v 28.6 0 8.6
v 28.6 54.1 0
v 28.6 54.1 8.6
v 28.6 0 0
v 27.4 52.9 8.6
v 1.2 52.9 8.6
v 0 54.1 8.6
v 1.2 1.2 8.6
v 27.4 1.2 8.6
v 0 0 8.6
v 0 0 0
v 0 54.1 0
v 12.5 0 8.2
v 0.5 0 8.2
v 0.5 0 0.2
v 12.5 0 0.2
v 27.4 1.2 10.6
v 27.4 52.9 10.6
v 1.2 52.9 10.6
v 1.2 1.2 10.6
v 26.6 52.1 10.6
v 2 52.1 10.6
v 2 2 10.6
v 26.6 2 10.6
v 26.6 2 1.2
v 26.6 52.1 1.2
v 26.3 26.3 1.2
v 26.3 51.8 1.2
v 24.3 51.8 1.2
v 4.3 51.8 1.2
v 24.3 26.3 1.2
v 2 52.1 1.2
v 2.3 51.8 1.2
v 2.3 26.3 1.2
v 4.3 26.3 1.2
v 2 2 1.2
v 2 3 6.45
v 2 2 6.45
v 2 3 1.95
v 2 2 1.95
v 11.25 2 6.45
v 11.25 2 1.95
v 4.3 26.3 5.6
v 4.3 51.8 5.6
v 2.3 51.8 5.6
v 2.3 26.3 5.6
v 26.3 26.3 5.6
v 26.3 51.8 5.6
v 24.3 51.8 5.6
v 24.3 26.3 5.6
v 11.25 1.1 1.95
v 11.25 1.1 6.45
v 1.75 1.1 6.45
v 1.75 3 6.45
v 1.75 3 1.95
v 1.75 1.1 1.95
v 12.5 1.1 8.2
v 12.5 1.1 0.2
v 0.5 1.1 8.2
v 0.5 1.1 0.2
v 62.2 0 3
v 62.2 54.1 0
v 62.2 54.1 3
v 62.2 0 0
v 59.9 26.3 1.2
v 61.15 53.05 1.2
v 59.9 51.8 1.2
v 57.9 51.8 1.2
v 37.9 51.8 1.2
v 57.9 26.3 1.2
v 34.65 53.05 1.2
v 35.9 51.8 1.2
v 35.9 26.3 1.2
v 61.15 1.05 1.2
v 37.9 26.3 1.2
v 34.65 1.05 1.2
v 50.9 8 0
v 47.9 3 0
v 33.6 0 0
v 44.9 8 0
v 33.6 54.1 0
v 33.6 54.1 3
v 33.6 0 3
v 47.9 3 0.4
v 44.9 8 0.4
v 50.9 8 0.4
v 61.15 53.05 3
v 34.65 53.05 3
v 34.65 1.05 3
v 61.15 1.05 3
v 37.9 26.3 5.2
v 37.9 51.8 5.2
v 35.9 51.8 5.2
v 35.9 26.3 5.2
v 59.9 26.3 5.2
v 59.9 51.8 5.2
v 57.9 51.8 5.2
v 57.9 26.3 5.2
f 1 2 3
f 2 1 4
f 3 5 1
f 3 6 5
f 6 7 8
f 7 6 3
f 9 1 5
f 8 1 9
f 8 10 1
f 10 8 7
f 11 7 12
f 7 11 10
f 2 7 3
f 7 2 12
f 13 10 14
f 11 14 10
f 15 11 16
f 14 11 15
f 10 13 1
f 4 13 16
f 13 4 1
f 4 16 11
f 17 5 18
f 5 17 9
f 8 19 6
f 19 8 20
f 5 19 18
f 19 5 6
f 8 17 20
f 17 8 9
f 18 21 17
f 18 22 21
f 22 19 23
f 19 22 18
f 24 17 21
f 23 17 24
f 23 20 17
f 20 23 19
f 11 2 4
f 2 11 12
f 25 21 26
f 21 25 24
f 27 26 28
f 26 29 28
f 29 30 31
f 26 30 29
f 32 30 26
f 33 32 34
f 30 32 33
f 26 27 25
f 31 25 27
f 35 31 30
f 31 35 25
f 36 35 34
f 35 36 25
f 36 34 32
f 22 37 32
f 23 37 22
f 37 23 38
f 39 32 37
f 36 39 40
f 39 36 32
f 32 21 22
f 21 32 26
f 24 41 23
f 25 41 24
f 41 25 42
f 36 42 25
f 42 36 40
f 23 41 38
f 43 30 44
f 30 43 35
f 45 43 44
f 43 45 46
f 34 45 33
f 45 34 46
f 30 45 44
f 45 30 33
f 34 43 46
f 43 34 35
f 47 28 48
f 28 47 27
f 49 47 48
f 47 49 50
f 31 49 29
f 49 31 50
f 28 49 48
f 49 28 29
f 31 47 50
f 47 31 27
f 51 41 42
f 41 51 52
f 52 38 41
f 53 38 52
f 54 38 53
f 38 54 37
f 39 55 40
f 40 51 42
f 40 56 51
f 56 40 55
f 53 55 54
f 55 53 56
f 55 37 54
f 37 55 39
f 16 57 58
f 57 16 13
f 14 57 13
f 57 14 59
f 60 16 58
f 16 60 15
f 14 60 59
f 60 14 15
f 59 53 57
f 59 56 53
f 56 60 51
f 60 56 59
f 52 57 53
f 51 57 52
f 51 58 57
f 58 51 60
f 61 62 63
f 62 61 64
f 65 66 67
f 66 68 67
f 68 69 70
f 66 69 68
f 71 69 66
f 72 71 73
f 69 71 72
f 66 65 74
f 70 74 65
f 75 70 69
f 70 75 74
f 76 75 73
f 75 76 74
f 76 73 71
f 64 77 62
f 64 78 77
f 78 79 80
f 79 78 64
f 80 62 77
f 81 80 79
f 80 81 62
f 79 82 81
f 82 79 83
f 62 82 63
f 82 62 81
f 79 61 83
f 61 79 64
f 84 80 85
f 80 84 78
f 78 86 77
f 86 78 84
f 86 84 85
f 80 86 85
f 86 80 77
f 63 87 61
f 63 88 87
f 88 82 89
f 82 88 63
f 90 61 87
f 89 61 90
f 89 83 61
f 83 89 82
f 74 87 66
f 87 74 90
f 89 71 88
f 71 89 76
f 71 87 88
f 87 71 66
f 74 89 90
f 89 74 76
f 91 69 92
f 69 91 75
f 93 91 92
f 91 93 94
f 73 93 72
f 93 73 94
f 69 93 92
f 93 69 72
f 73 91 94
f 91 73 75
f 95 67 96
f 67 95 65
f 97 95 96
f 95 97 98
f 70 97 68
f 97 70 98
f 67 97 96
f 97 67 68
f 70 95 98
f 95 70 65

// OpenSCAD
// Two-part case for the FYSETC SD-WIFI (non-Pro). Only the micro-USB port is open.
//
// Open in OpenSCAD and use the Customizer (Window > Customizer) to set the measured values,
// or render from the command line:
//   openscad -D 'part="base"' -o base.stl case.scad
//   openscad -D 'part="lid"'  -o lid.stl  case.scad
//
// Coordinates, looking down at the board with its front (ESP module, buttons) up: x across the
// board's 24 mm width, y along its length with y=0 at the USB/button end and y=board_l at the
// SD contacts, z up. The back of the board carries the micro-USB port (at the USB end, near the
// left edge from this view), the microSD slot and the switch.
//
// The board is held only by its SD-card half, which has no parts on either face: rails in the
// base support it from below and posts in the lid press on it from above.

/* [What to render] */
part = "both"; // [base, lid, both]

/* [Board: measure these] */
// Published
board_w = 24.0;
// Published
board_l = 49.5;
// PCB thickness
board_t = 1.0;
// Gap under the board: the tallest part on the back (micro-USB, microSD slot, switch) + 0.4, or more. The default keeps a USB plug's ~8 mm moulded body above the case's bottom face.
under = 4.4;
// Tallest part on the front (ESP module, buttons) + 0.4
over = 4.0;
// Micro-USB centre from the board's left edge, front up, USB end towards you
usb_x = 4.2;
// Micro-USB centre below the PCB's back face
usb_drop = 1.4;
// Where the part-free SD-card half starts, from the USB end
grip_from = 24.0;

/* [Case] */
// Gap between board and case walls
fit = 0.3;
// Leaves the lid's skirt about 1 mm, over two 0.4 mm nozzle lines
wall = 2.0;
floor_t = 1.2;
lid_t = 1.2;
// Inner part of the wall that rises into the lid's skirt
lip_w = 0.8;
lip_h = 2.0;
// Lid skirt to lip, per side. Raise it if the lid is too tight.
skirt_gap = 0.15;
// The micro-USB plug's metal shell, with margin
usb_hole = [9.5, 4.5];
// The plug's moulded body sits in this
usb_recess = [12.0, 8.0];
// Wall left behind the recess, so the plug reaches the connector
usb_wall = 0.9;
rail_w = 2.0;

/* [Hidden] */
cav_w = board_w + 2 * fit;
cav_l = board_l + 2 * fit;
out_w = cav_w + 2 * wall;
out_l = cav_l + 2 * wall;
pcb_z = floor_t + under;  // PCB back face
base_h = pcb_z + board_t + over;
usb_z = pcb_z - usb_drop;
rail_l = board_l - grip_from;
rail_xs = [wall + fit, wall + fit + board_w - rail_w];

assert(usb_z - usb_recess[1] / 2 >= 0,
       str("USB plug body would hang ", -(usb_z - usb_recess[1] / 2), " mm below the case; raise `under`"));
assert(wall - lip_w - skirt_gap >= 0.8, "the lid's skirt would be under 0.8 mm; raise `wall`");

module base() {
    difference() {
        union() {
            difference() {
                cube([out_w, out_l, base_h]);
                translate([wall, wall, floor_t]) cube([cav_w, cav_l, base_h]);
                // Lip: the wall's outer part stops lip_h short of the top, so the lid's skirt slides over.
                translate([0, 0, base_h - lip_h]) difference() {
                    cube([out_w, out_l, lip_h + 1]);
                    translate([wall - lip_w, wall - lip_w, -1]) cube([cav_w + 2 * lip_w, cav_l + 2 * lip_w, lip_h + 3]);
                }
            }
            // Rails under the board's SD-card half, along both long edges.
            for (x = rail_xs) translate([x, wall + fit + grip_from, floor_t - 0.01]) cube([rail_w, rail_l, under + 0.01]);
        }
        // Micro-USB: a hole for the shell through the end wall, and a recess outside for the plug body.
        cx = wall + fit + usb_x;
        translate([cx - usb_hole[0] / 2, -1, usb_z - usb_hole[1] / 2]) cube([usb_hole[0], wall + 2, usb_hole[1]]);
        translate([cx - usb_recess[0] / 2, -1, usb_z - usb_recess[1] / 2]) cube([usb_recess[0], 1 + wall - usb_wall, usb_recess[1]]);
    }
}

// Built as printed: flat face down, skirt and posts up. To close the case, flip it over its long
// side, so the posts stay over the SD-card half; the arrow on its face points at the USB end.
module lid() {
    inset = wall - lip_w - skirt_gap;
    difference() {
        cube([out_w, out_l, lid_t]);
        // Arrow engraved in the outer face, pointing at the USB end.
        translate([out_w / 2, 6, -0.01]) linear_extrude(0.41) polygon([[0, -3], [-3, 2], [3, 2]]);
    }
    // Skirt and posts start 0.01 mm inside the plate so the union is one solid.
    translate([0, 0, lid_t - 0.01]) difference() {
        cube([out_w, out_l, lip_h - 0.2 + 0.01]);
        translate([inset, inset, -1]) cube([out_w - 2 * inset, out_l - 2 * inset, lip_h + 2]);
    }
    // Posts press the board's SD-card half against the rails. `over` is the gap from the PCB's
    // front to the lid. The rails sit symmetrically, so the flip leaves the posts over them.
    for (x = rail_xs) translate([x, wall + fit + grip_from, lid_t - 0.01]) cube([rail_w, rail_l, over + 0.01]);
}

if (part == "base") base();
else if (part == "lid") lid();
else {
    base();
    translate([out_w + 5, 0, 0]) lid();
}
